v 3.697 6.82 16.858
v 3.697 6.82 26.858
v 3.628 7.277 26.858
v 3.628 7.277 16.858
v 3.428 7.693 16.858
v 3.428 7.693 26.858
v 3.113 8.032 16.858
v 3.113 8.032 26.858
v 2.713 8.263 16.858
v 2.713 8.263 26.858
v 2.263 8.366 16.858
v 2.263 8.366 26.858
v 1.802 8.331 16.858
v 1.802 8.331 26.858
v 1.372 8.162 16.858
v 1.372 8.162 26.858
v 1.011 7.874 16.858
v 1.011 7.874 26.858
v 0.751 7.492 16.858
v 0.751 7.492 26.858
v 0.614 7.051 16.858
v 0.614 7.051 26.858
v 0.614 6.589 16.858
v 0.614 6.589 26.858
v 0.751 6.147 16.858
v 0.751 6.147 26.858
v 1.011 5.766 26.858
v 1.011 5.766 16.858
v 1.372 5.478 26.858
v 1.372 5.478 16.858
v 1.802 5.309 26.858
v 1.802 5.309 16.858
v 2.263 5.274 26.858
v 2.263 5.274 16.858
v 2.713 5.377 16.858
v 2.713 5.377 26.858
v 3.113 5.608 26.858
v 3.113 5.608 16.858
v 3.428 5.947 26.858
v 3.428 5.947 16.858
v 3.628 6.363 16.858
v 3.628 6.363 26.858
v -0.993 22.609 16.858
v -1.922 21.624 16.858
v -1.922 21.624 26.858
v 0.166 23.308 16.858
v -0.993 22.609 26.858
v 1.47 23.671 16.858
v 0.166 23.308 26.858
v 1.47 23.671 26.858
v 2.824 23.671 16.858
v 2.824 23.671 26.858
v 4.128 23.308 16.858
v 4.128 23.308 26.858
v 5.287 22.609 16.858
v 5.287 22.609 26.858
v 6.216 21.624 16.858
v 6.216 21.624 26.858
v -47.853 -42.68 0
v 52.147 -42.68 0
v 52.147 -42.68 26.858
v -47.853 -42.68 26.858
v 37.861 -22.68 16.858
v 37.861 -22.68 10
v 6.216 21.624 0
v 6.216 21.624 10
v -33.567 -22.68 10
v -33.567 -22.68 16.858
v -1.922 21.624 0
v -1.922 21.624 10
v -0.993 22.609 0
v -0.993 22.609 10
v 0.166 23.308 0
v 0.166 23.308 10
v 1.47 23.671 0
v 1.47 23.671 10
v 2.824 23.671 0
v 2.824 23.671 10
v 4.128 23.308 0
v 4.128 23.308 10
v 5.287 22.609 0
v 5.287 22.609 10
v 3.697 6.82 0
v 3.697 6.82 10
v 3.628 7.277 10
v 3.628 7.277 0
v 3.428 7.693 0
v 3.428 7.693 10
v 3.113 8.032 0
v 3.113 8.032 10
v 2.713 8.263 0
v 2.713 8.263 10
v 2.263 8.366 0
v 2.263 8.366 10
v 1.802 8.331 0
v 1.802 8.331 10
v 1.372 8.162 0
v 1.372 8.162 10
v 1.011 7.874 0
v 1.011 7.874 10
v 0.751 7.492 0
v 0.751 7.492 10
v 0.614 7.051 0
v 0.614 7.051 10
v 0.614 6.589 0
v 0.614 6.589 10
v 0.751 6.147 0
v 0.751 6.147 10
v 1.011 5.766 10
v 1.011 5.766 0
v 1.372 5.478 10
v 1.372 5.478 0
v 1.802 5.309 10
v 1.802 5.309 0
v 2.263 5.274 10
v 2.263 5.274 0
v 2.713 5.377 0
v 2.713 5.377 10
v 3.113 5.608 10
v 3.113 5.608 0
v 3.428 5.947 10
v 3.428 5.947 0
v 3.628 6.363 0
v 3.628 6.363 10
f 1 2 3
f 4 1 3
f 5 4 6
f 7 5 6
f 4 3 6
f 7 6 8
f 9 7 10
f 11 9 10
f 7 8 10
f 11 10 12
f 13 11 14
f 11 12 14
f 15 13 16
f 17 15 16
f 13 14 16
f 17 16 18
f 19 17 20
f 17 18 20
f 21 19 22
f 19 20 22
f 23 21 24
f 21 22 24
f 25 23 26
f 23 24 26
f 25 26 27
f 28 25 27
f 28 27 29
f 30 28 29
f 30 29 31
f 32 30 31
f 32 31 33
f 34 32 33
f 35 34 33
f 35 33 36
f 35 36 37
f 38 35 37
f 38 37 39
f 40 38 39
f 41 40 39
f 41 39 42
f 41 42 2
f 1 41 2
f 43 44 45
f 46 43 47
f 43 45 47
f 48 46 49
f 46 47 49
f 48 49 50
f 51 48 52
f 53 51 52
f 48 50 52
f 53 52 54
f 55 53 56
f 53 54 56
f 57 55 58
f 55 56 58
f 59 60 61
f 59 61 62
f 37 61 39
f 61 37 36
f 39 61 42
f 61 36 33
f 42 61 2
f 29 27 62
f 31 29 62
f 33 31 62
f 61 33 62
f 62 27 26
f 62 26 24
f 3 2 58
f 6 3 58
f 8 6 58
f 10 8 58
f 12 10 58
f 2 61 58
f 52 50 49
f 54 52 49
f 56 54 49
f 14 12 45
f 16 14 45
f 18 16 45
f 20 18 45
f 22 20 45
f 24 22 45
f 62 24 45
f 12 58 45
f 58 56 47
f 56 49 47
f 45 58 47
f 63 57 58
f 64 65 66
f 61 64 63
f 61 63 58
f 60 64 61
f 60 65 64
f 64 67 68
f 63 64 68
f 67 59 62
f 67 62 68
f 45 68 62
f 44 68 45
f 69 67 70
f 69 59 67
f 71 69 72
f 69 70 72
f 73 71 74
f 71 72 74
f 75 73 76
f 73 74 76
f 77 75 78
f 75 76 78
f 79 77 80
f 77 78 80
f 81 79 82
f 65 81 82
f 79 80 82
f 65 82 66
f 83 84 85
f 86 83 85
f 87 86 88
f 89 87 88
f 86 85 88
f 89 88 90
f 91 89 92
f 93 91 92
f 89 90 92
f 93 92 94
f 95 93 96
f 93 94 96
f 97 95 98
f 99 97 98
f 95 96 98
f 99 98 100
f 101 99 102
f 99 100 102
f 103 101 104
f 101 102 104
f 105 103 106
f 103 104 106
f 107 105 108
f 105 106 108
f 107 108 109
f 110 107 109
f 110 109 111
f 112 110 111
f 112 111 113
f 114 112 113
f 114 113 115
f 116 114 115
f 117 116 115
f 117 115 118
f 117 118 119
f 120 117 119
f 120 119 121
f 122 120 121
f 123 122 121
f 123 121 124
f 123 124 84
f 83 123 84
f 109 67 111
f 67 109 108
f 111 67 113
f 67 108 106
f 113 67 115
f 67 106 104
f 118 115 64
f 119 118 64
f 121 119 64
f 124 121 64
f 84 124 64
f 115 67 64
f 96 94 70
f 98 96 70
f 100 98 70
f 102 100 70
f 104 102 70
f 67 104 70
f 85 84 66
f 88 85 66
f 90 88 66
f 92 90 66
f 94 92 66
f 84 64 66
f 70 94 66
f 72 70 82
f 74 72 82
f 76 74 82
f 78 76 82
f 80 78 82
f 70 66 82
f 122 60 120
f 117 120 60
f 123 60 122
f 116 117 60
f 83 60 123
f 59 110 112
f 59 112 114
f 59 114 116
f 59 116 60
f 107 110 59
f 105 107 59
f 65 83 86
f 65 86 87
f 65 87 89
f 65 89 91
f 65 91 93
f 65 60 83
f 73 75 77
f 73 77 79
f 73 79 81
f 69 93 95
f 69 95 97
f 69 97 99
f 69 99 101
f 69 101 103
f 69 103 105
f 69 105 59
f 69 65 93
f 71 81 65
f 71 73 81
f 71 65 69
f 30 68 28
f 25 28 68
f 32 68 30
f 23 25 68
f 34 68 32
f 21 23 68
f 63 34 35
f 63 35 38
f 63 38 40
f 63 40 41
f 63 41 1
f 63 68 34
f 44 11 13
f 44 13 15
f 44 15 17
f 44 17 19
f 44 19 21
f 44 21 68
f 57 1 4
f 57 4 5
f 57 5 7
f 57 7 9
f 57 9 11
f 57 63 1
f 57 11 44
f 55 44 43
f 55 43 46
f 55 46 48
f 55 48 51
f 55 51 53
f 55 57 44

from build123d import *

# Parameters (mm, degrees)
BOSS_EXTRUDE1_DEPTH = 26.858
CUT_EXTRUDE1_REACH  = 113.995
SKETCH2_W           = 6.858
SKETCH2_H           = 50
CUT_EXTRUDE2_REACH  = 74.541
SKETCH3_R           = 1.55
FILLET1_R           = 5


with BuildPart() as part:
    # Sketch1 → Boss-Extrude1 (new body)
    with BuildSketch(Plane.XY):
        Polygon((-47.852923476, -42.680149177), (2.147076524, 27.319850823), (52.147076524, -42.680149177), align=None)
    extrude(amount=BOSS_EXTRUDE1_DEPTH)

    # Cut-Extrude1: up to this plane
    cut_extrude1_end = Plane(origin=(-47.852923476, -42.680149177, 26.858), z_dir=(0.8137334712067356, -0.5812381937190956, 0))
    # Sketch2 → Cut-Extrude1 (cut, up to the surface)
    with BuildSketch(Plane.ZY.offset(-52.147076524), mode=Mode.PRIVATE) as cut_extrude1_sk1:
        with Locations((13.429, 2.319850823)):
            Rectangle(SKETCH2_W, SKETCH2_H)
    cut_extrude1_tool1 = split(extrude(cut_extrude1_sk1.sketch, amount=CUT_EXTRUDE1_REACH, mode=Mode.PRIVATE), bisect_by=cut_extrude1_end, keep=Keep.BOTH, mode=Mode.PRIVATE)
    add(cut_extrude1_tool1.solids().sort_by_distance((52.147077, 2.319851, 13.429))[0], mode=Mode.SUBTRACT)

    # Cut-Extrude2: up to this face of the body (flat: up to its plane)
    cut_extrude2_end = Plane(part.part.faces().sort_by_distance((2.147076524, -19.346815843, 0))[0])
    # Sketch3 → Cut-Extrude2 (cut, up to the picked face)
    with BuildSketch(Plane.XY.offset(26.858), mode=Mode.PRIVATE) as cut_extrude2_sk1:
        with Locations((2.147076524, 6.819850823)):
            Circle(SKETCH3_R)
    cut_extrude2_tool1 = split(extrude(cut_extrude2_sk1.sketch, amount=-CUT_EXTRUDE2_REACH, mode=Mode.PRIVATE), bisect_by=cut_extrude2_end, keep=Keep.BOTH, mode=Mode.PRIVATE)
    add(cut_extrude2_tool1.solids().sort_by(Axis((2.147077, 6.819851, 26.858), (0, 0, -1)))[0], mode=Mode.SUBTRACT)

    # Fillet1
    fillet1_edges = [part.edges().sort_by_distance(p)[0] for p in [
        (2.147076524, 27.319850823, 5),
        (2.147076524, 27.319850823, 21.858),
    ]]
    fillet(fillet1_edges, radius=FILLET1_R)


solid = part.part
